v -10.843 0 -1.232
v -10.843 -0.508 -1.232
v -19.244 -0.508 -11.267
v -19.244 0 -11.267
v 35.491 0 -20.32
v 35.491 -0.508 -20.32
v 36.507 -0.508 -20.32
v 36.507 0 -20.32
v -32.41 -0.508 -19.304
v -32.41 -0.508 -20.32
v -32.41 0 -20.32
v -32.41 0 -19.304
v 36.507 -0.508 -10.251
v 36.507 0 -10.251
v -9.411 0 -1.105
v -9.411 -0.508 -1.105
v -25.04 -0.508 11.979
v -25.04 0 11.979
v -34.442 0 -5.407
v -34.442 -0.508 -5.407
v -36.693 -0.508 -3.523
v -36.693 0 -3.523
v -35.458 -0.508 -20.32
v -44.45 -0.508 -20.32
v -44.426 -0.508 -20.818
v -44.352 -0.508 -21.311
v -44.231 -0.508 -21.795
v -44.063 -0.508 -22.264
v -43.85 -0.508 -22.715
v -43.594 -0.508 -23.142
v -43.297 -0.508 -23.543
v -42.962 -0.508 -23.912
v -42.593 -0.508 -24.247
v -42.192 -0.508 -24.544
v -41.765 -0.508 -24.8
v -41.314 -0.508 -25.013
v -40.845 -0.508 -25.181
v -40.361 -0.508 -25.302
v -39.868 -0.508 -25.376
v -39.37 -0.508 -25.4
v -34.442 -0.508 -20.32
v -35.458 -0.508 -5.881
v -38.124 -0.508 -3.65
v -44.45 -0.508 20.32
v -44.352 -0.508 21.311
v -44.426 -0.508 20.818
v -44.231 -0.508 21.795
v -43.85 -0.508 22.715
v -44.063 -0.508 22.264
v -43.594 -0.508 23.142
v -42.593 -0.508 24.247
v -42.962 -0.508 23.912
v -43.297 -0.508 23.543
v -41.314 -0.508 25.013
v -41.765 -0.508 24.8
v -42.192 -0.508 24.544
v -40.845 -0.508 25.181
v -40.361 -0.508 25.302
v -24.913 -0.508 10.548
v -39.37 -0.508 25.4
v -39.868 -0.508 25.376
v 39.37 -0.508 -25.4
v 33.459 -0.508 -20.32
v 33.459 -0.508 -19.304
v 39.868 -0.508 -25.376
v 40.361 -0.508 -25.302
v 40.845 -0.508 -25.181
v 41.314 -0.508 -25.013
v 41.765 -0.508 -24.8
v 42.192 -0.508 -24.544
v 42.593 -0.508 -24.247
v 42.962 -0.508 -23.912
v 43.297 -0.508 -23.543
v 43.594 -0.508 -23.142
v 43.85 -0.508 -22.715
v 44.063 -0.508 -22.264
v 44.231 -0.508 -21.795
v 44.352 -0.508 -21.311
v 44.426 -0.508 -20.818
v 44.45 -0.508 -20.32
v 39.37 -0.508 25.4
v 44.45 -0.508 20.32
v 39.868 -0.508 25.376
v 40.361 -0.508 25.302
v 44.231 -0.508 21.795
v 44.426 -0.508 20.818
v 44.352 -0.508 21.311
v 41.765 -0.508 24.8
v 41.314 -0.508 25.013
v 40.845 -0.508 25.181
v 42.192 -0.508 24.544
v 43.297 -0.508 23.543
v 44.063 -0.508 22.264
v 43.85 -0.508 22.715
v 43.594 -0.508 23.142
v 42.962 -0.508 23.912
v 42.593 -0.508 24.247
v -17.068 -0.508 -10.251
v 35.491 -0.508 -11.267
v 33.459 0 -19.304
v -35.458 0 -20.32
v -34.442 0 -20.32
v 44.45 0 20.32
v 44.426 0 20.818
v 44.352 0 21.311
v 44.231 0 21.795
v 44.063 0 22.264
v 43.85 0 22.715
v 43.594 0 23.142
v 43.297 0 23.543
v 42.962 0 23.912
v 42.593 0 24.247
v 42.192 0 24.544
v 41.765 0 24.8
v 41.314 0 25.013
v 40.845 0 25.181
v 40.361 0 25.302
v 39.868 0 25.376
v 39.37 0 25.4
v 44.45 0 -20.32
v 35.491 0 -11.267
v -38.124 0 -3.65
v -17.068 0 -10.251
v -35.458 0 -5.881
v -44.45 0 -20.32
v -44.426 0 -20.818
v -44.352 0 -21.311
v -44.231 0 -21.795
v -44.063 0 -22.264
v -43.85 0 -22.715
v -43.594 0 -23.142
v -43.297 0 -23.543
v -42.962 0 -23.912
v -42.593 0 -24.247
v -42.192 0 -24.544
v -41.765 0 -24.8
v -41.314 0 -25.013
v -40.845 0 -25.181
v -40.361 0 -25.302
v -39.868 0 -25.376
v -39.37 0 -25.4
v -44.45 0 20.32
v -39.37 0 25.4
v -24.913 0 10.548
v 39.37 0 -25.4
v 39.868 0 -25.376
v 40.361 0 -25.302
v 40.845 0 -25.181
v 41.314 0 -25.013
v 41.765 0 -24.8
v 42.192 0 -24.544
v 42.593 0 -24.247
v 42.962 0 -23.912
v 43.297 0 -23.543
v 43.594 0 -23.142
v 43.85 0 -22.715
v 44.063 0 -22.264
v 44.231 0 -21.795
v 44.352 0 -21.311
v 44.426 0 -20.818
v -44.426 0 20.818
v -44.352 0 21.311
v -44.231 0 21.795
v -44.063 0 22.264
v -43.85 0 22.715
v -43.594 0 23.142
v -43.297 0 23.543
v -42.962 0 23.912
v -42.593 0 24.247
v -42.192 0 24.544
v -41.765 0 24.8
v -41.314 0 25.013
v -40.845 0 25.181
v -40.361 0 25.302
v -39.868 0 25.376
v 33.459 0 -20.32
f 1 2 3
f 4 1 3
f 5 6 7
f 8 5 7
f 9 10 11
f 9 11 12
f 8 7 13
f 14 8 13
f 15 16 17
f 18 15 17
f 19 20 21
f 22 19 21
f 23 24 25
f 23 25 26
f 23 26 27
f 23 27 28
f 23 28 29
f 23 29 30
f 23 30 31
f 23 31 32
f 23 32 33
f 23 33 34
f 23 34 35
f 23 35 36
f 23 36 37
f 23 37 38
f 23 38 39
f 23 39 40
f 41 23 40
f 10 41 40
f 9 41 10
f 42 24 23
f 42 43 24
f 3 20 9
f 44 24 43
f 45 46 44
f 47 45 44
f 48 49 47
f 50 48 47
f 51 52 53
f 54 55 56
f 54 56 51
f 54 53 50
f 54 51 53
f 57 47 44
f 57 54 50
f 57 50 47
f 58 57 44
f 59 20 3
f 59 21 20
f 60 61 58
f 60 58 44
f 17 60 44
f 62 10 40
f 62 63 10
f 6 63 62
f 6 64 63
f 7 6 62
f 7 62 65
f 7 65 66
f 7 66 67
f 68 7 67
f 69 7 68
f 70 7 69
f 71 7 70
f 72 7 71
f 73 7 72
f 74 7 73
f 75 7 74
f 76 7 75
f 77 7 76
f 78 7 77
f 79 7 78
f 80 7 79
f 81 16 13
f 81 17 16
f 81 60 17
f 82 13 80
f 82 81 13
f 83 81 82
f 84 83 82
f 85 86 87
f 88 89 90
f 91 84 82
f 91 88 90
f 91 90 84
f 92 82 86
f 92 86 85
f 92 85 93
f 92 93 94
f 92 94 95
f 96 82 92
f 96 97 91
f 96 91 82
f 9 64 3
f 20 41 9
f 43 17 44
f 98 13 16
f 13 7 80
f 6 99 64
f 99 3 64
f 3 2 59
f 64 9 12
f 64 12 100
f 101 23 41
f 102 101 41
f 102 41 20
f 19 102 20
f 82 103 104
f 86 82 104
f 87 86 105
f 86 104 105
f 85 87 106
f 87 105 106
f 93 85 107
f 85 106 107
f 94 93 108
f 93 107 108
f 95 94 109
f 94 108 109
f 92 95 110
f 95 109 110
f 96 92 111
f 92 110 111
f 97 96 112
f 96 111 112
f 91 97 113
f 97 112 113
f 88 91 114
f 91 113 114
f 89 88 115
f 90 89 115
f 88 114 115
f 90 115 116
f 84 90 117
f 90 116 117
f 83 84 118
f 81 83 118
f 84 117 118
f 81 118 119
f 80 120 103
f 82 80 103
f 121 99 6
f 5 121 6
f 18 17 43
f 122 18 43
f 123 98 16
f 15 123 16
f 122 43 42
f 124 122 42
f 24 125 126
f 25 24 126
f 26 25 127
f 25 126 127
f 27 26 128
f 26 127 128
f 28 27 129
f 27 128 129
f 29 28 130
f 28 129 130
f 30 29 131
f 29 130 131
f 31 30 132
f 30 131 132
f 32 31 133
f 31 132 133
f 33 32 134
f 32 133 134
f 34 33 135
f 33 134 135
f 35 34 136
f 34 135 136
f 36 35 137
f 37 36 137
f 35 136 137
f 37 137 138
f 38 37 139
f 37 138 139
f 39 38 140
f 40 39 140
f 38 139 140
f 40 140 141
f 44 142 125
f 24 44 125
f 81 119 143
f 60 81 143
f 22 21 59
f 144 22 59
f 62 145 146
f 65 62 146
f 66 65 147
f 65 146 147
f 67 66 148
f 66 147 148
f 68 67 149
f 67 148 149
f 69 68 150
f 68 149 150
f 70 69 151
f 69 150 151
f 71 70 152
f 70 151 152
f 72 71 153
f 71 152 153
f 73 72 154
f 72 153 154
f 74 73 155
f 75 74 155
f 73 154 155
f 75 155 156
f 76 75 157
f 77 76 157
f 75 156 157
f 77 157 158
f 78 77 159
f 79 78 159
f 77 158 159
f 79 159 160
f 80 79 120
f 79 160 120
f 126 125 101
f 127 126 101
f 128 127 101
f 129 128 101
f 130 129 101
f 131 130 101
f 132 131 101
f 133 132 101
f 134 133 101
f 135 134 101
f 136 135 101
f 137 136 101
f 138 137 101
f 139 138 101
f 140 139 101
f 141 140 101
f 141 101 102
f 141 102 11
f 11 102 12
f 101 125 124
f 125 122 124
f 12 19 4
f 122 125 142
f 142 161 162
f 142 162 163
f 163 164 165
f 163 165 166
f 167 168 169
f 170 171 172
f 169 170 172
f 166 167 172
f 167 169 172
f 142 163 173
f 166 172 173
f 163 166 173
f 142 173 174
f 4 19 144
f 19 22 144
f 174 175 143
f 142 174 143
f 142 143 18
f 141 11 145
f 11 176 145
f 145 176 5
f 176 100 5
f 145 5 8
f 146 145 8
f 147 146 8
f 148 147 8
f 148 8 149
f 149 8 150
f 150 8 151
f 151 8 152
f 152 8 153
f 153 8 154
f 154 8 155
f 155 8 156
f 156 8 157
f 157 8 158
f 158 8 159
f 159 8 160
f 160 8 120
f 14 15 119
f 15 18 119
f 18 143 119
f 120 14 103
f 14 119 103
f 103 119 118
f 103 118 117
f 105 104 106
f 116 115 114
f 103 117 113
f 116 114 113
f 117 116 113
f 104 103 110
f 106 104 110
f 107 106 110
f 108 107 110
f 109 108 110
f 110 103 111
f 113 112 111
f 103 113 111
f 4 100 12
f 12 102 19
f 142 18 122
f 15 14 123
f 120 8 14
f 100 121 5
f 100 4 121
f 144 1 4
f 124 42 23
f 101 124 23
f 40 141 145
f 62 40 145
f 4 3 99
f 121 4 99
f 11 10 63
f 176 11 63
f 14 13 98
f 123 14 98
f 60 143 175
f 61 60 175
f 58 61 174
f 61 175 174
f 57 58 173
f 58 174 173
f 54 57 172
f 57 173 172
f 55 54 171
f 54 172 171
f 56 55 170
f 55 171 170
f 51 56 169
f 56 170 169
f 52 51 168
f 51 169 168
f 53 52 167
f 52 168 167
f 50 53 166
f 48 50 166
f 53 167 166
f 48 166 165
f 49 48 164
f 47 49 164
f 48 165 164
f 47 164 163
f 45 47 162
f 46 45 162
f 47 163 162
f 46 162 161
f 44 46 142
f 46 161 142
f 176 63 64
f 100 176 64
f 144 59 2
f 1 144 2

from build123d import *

# Parameters (mm, degrees)
F1_DEPTH = 0.508
F2_W     = 65.868683
F2_H     = 1.016
F3_DEPTH = 0.509


with BuildPart() as f1:
    # F0 (on Front) → F1 (new body)
    with BuildSketch(Plane.XZ):
        with BuildLine():
            Line((39.37, 25.4), (-39.37, 25.4))
            ThreePointArc((-39.37, 25.4), (-42.962102, 23.912102), (-44.45, 20.32))
            Line((-44.45, 20.32), (-44.45, -20.32))
            ThreePointArc((-44.45, -20.32), (-42.962102, -23.912102), (-39.37, -25.4))
            Line((-39.37, -25.4), (39.37, -25.4))
            ThreePointArc((39.37, -25.4), (42.962102, -23.912102), (44.45, -20.32))
            Line((44.45, -20.32), (44.45, 20.32))
            ThreePointArc((44.45, 20.32), (42.962102, 23.912102), (39.37, 25.4))
        make_face()
    extrude(amount=F1_DEPTH)

    # F2 (on face) → F3 (cut, through all)
    with BuildSketch(Plane.XZ.offset(0.508)):
        Polygon((-24.913168, 10.547717), (-10.842625, -1.23167), (-19.243895, -11.267034), (35.490545, -11.267034), (35.490545, -20.32), (36.506545, -20.32), (36.506545, -10.251034), (-17.068302, -10.251034), (-9.411394, -1.104816), (-25.040023, 11.978947), (-38.123786, -3.649681), (-35.458138, -5.881272), (-35.458138, -20.32), (-34.442138, -20.32), (-34.442138, -5.406801), (-36.692555, -3.522827), align=None)
        with Locations((0.524204, -19.812)):
            Rectangle(F2_W, F2_H)
    extrude(amount=-F3_DEPTH, mode=Mode.SUBTRACT)


solid = f1.part
